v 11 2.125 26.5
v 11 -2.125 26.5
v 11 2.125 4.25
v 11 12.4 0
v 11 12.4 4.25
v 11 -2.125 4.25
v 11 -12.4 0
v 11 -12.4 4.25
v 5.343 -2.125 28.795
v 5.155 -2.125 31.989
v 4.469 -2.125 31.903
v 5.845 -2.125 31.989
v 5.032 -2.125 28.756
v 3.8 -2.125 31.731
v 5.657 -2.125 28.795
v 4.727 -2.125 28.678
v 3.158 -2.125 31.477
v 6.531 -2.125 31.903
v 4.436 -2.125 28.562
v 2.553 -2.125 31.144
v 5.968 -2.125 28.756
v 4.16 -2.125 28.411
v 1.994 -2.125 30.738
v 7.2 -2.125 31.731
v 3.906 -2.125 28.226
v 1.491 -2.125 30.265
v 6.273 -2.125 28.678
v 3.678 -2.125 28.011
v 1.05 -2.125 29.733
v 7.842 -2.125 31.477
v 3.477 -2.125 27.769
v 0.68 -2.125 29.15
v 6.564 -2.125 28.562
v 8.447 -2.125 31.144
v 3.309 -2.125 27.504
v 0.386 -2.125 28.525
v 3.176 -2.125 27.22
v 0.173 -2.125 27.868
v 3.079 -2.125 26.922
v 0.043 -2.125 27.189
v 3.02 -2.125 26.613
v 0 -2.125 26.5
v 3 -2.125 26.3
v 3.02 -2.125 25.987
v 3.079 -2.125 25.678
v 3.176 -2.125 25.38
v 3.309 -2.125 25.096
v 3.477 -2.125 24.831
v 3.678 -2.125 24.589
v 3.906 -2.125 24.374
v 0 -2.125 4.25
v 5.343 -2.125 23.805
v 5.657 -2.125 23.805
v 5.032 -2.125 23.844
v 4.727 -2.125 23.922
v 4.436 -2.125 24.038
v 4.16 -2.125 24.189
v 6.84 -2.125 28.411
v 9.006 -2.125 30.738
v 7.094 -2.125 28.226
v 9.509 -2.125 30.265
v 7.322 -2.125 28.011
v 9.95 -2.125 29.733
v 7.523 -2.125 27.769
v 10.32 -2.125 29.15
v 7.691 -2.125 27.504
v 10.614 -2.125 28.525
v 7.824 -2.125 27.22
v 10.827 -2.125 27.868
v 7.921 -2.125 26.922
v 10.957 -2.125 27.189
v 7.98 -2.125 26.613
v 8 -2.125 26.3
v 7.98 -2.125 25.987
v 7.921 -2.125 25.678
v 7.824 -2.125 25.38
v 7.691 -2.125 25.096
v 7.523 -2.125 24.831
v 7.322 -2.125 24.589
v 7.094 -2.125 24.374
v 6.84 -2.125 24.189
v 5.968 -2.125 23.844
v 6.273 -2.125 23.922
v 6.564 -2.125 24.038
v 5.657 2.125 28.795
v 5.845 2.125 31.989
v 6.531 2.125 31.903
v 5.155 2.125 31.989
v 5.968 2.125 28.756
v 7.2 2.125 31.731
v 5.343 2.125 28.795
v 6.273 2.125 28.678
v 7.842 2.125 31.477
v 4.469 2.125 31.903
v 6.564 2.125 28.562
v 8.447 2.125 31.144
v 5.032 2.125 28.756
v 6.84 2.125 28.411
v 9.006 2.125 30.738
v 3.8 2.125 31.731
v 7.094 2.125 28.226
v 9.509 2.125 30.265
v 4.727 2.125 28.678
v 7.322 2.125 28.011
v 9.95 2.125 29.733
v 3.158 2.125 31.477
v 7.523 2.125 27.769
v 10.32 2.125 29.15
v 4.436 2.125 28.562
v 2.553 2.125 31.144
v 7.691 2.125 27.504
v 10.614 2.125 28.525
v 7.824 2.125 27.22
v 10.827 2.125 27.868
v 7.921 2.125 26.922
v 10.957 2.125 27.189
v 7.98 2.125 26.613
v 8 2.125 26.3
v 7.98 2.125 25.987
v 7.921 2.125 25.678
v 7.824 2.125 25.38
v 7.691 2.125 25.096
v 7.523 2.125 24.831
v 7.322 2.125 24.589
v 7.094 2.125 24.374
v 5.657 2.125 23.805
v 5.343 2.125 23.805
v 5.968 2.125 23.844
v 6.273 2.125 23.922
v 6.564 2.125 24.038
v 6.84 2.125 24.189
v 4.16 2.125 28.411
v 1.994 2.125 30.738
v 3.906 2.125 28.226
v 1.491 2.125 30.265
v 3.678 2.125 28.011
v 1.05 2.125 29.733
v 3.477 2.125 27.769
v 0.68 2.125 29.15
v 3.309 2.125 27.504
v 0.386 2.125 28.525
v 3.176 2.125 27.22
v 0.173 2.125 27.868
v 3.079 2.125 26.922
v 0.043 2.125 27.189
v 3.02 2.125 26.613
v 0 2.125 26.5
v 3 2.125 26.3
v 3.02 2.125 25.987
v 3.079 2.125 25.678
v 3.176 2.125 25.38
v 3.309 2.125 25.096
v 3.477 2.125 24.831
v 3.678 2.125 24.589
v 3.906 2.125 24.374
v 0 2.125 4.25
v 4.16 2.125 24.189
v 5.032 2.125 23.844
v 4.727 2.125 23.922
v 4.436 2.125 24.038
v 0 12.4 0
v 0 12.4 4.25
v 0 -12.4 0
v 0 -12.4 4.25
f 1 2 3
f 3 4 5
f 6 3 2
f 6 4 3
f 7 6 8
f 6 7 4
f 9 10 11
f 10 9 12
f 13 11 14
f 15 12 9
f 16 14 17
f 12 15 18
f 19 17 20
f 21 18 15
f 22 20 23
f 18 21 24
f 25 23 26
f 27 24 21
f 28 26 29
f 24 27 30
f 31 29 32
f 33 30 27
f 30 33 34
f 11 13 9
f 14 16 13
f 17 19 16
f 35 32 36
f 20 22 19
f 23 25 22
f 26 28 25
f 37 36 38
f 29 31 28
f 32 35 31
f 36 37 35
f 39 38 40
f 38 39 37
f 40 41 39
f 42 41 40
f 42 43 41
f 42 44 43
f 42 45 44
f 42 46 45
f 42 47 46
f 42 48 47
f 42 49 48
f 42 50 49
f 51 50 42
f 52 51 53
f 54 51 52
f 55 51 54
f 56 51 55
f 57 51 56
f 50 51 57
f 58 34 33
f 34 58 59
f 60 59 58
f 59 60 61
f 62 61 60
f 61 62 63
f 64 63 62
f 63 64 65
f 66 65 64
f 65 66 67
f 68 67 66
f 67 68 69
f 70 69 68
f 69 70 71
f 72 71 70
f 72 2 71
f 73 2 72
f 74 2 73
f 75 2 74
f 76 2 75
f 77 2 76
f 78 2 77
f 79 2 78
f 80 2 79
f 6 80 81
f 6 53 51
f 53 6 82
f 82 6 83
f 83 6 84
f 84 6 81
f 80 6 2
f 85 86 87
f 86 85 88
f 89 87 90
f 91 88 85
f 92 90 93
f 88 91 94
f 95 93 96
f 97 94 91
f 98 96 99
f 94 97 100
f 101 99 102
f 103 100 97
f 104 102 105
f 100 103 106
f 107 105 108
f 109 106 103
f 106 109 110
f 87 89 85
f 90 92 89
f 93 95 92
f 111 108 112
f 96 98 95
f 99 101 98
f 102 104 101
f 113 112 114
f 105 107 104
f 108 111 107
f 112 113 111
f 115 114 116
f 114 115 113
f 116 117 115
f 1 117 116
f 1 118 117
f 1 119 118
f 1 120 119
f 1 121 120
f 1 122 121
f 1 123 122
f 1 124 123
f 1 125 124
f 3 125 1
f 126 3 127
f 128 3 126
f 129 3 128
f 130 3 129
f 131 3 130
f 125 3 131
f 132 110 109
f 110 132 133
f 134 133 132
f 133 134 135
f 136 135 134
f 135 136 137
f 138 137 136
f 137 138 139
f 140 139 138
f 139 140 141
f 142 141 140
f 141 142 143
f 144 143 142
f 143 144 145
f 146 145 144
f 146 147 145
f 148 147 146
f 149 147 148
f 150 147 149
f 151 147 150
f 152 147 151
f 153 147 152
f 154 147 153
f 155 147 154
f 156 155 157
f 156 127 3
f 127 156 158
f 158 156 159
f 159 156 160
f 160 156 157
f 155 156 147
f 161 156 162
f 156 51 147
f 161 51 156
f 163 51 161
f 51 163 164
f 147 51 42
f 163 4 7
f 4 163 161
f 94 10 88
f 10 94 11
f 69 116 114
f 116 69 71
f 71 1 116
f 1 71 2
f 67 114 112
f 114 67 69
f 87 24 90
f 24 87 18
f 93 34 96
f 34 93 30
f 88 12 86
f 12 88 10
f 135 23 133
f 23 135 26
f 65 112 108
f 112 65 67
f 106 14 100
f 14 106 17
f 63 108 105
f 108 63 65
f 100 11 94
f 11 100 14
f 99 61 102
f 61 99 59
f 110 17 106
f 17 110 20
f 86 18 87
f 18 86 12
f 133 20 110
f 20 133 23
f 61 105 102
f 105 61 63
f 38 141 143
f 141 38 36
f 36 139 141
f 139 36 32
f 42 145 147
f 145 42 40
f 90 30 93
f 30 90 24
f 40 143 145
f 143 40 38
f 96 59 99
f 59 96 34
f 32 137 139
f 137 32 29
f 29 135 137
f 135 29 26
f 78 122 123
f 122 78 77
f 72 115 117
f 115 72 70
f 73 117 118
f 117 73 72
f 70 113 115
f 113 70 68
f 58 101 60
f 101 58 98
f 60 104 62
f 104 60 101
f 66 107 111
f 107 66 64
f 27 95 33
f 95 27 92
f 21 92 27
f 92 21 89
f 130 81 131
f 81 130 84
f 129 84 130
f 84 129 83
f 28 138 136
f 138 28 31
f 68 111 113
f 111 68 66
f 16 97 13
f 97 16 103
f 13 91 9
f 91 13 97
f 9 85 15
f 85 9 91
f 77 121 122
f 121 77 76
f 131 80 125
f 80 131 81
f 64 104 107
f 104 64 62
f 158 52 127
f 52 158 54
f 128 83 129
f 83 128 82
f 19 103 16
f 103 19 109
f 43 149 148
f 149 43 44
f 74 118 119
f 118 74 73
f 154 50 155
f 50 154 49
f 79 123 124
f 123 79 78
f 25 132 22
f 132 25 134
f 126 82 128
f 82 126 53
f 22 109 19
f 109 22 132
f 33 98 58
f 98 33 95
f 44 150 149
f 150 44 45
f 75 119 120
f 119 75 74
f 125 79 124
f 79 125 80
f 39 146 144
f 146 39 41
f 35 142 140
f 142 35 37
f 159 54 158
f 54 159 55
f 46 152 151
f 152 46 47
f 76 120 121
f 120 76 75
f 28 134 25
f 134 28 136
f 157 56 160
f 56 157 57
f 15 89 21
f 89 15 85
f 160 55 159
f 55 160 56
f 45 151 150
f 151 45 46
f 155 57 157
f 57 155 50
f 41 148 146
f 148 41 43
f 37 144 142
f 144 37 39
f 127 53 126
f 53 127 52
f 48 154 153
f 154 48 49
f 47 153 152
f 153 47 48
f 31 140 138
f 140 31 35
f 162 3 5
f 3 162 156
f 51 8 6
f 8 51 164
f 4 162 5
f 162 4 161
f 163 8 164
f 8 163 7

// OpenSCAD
union(){
    translate([0,2.125,0]){
    rotate([90,0,0]){
        difference(){
            union(){
                cube([11,26.5,4.25]);
                translate([5.5,26.5,0]){
                    cylinder(d=11,h=4.25, center=false,$fn=50);
                }
            }      
            translate([5.5,26.3,-0.2]){  
                cylinder(d=5,h=4.5,center=false,$fn=50);
            }
        }
    }
}
translate([0,-12.4,0]){
    cube([11,24.8,4.25]);

}
}
